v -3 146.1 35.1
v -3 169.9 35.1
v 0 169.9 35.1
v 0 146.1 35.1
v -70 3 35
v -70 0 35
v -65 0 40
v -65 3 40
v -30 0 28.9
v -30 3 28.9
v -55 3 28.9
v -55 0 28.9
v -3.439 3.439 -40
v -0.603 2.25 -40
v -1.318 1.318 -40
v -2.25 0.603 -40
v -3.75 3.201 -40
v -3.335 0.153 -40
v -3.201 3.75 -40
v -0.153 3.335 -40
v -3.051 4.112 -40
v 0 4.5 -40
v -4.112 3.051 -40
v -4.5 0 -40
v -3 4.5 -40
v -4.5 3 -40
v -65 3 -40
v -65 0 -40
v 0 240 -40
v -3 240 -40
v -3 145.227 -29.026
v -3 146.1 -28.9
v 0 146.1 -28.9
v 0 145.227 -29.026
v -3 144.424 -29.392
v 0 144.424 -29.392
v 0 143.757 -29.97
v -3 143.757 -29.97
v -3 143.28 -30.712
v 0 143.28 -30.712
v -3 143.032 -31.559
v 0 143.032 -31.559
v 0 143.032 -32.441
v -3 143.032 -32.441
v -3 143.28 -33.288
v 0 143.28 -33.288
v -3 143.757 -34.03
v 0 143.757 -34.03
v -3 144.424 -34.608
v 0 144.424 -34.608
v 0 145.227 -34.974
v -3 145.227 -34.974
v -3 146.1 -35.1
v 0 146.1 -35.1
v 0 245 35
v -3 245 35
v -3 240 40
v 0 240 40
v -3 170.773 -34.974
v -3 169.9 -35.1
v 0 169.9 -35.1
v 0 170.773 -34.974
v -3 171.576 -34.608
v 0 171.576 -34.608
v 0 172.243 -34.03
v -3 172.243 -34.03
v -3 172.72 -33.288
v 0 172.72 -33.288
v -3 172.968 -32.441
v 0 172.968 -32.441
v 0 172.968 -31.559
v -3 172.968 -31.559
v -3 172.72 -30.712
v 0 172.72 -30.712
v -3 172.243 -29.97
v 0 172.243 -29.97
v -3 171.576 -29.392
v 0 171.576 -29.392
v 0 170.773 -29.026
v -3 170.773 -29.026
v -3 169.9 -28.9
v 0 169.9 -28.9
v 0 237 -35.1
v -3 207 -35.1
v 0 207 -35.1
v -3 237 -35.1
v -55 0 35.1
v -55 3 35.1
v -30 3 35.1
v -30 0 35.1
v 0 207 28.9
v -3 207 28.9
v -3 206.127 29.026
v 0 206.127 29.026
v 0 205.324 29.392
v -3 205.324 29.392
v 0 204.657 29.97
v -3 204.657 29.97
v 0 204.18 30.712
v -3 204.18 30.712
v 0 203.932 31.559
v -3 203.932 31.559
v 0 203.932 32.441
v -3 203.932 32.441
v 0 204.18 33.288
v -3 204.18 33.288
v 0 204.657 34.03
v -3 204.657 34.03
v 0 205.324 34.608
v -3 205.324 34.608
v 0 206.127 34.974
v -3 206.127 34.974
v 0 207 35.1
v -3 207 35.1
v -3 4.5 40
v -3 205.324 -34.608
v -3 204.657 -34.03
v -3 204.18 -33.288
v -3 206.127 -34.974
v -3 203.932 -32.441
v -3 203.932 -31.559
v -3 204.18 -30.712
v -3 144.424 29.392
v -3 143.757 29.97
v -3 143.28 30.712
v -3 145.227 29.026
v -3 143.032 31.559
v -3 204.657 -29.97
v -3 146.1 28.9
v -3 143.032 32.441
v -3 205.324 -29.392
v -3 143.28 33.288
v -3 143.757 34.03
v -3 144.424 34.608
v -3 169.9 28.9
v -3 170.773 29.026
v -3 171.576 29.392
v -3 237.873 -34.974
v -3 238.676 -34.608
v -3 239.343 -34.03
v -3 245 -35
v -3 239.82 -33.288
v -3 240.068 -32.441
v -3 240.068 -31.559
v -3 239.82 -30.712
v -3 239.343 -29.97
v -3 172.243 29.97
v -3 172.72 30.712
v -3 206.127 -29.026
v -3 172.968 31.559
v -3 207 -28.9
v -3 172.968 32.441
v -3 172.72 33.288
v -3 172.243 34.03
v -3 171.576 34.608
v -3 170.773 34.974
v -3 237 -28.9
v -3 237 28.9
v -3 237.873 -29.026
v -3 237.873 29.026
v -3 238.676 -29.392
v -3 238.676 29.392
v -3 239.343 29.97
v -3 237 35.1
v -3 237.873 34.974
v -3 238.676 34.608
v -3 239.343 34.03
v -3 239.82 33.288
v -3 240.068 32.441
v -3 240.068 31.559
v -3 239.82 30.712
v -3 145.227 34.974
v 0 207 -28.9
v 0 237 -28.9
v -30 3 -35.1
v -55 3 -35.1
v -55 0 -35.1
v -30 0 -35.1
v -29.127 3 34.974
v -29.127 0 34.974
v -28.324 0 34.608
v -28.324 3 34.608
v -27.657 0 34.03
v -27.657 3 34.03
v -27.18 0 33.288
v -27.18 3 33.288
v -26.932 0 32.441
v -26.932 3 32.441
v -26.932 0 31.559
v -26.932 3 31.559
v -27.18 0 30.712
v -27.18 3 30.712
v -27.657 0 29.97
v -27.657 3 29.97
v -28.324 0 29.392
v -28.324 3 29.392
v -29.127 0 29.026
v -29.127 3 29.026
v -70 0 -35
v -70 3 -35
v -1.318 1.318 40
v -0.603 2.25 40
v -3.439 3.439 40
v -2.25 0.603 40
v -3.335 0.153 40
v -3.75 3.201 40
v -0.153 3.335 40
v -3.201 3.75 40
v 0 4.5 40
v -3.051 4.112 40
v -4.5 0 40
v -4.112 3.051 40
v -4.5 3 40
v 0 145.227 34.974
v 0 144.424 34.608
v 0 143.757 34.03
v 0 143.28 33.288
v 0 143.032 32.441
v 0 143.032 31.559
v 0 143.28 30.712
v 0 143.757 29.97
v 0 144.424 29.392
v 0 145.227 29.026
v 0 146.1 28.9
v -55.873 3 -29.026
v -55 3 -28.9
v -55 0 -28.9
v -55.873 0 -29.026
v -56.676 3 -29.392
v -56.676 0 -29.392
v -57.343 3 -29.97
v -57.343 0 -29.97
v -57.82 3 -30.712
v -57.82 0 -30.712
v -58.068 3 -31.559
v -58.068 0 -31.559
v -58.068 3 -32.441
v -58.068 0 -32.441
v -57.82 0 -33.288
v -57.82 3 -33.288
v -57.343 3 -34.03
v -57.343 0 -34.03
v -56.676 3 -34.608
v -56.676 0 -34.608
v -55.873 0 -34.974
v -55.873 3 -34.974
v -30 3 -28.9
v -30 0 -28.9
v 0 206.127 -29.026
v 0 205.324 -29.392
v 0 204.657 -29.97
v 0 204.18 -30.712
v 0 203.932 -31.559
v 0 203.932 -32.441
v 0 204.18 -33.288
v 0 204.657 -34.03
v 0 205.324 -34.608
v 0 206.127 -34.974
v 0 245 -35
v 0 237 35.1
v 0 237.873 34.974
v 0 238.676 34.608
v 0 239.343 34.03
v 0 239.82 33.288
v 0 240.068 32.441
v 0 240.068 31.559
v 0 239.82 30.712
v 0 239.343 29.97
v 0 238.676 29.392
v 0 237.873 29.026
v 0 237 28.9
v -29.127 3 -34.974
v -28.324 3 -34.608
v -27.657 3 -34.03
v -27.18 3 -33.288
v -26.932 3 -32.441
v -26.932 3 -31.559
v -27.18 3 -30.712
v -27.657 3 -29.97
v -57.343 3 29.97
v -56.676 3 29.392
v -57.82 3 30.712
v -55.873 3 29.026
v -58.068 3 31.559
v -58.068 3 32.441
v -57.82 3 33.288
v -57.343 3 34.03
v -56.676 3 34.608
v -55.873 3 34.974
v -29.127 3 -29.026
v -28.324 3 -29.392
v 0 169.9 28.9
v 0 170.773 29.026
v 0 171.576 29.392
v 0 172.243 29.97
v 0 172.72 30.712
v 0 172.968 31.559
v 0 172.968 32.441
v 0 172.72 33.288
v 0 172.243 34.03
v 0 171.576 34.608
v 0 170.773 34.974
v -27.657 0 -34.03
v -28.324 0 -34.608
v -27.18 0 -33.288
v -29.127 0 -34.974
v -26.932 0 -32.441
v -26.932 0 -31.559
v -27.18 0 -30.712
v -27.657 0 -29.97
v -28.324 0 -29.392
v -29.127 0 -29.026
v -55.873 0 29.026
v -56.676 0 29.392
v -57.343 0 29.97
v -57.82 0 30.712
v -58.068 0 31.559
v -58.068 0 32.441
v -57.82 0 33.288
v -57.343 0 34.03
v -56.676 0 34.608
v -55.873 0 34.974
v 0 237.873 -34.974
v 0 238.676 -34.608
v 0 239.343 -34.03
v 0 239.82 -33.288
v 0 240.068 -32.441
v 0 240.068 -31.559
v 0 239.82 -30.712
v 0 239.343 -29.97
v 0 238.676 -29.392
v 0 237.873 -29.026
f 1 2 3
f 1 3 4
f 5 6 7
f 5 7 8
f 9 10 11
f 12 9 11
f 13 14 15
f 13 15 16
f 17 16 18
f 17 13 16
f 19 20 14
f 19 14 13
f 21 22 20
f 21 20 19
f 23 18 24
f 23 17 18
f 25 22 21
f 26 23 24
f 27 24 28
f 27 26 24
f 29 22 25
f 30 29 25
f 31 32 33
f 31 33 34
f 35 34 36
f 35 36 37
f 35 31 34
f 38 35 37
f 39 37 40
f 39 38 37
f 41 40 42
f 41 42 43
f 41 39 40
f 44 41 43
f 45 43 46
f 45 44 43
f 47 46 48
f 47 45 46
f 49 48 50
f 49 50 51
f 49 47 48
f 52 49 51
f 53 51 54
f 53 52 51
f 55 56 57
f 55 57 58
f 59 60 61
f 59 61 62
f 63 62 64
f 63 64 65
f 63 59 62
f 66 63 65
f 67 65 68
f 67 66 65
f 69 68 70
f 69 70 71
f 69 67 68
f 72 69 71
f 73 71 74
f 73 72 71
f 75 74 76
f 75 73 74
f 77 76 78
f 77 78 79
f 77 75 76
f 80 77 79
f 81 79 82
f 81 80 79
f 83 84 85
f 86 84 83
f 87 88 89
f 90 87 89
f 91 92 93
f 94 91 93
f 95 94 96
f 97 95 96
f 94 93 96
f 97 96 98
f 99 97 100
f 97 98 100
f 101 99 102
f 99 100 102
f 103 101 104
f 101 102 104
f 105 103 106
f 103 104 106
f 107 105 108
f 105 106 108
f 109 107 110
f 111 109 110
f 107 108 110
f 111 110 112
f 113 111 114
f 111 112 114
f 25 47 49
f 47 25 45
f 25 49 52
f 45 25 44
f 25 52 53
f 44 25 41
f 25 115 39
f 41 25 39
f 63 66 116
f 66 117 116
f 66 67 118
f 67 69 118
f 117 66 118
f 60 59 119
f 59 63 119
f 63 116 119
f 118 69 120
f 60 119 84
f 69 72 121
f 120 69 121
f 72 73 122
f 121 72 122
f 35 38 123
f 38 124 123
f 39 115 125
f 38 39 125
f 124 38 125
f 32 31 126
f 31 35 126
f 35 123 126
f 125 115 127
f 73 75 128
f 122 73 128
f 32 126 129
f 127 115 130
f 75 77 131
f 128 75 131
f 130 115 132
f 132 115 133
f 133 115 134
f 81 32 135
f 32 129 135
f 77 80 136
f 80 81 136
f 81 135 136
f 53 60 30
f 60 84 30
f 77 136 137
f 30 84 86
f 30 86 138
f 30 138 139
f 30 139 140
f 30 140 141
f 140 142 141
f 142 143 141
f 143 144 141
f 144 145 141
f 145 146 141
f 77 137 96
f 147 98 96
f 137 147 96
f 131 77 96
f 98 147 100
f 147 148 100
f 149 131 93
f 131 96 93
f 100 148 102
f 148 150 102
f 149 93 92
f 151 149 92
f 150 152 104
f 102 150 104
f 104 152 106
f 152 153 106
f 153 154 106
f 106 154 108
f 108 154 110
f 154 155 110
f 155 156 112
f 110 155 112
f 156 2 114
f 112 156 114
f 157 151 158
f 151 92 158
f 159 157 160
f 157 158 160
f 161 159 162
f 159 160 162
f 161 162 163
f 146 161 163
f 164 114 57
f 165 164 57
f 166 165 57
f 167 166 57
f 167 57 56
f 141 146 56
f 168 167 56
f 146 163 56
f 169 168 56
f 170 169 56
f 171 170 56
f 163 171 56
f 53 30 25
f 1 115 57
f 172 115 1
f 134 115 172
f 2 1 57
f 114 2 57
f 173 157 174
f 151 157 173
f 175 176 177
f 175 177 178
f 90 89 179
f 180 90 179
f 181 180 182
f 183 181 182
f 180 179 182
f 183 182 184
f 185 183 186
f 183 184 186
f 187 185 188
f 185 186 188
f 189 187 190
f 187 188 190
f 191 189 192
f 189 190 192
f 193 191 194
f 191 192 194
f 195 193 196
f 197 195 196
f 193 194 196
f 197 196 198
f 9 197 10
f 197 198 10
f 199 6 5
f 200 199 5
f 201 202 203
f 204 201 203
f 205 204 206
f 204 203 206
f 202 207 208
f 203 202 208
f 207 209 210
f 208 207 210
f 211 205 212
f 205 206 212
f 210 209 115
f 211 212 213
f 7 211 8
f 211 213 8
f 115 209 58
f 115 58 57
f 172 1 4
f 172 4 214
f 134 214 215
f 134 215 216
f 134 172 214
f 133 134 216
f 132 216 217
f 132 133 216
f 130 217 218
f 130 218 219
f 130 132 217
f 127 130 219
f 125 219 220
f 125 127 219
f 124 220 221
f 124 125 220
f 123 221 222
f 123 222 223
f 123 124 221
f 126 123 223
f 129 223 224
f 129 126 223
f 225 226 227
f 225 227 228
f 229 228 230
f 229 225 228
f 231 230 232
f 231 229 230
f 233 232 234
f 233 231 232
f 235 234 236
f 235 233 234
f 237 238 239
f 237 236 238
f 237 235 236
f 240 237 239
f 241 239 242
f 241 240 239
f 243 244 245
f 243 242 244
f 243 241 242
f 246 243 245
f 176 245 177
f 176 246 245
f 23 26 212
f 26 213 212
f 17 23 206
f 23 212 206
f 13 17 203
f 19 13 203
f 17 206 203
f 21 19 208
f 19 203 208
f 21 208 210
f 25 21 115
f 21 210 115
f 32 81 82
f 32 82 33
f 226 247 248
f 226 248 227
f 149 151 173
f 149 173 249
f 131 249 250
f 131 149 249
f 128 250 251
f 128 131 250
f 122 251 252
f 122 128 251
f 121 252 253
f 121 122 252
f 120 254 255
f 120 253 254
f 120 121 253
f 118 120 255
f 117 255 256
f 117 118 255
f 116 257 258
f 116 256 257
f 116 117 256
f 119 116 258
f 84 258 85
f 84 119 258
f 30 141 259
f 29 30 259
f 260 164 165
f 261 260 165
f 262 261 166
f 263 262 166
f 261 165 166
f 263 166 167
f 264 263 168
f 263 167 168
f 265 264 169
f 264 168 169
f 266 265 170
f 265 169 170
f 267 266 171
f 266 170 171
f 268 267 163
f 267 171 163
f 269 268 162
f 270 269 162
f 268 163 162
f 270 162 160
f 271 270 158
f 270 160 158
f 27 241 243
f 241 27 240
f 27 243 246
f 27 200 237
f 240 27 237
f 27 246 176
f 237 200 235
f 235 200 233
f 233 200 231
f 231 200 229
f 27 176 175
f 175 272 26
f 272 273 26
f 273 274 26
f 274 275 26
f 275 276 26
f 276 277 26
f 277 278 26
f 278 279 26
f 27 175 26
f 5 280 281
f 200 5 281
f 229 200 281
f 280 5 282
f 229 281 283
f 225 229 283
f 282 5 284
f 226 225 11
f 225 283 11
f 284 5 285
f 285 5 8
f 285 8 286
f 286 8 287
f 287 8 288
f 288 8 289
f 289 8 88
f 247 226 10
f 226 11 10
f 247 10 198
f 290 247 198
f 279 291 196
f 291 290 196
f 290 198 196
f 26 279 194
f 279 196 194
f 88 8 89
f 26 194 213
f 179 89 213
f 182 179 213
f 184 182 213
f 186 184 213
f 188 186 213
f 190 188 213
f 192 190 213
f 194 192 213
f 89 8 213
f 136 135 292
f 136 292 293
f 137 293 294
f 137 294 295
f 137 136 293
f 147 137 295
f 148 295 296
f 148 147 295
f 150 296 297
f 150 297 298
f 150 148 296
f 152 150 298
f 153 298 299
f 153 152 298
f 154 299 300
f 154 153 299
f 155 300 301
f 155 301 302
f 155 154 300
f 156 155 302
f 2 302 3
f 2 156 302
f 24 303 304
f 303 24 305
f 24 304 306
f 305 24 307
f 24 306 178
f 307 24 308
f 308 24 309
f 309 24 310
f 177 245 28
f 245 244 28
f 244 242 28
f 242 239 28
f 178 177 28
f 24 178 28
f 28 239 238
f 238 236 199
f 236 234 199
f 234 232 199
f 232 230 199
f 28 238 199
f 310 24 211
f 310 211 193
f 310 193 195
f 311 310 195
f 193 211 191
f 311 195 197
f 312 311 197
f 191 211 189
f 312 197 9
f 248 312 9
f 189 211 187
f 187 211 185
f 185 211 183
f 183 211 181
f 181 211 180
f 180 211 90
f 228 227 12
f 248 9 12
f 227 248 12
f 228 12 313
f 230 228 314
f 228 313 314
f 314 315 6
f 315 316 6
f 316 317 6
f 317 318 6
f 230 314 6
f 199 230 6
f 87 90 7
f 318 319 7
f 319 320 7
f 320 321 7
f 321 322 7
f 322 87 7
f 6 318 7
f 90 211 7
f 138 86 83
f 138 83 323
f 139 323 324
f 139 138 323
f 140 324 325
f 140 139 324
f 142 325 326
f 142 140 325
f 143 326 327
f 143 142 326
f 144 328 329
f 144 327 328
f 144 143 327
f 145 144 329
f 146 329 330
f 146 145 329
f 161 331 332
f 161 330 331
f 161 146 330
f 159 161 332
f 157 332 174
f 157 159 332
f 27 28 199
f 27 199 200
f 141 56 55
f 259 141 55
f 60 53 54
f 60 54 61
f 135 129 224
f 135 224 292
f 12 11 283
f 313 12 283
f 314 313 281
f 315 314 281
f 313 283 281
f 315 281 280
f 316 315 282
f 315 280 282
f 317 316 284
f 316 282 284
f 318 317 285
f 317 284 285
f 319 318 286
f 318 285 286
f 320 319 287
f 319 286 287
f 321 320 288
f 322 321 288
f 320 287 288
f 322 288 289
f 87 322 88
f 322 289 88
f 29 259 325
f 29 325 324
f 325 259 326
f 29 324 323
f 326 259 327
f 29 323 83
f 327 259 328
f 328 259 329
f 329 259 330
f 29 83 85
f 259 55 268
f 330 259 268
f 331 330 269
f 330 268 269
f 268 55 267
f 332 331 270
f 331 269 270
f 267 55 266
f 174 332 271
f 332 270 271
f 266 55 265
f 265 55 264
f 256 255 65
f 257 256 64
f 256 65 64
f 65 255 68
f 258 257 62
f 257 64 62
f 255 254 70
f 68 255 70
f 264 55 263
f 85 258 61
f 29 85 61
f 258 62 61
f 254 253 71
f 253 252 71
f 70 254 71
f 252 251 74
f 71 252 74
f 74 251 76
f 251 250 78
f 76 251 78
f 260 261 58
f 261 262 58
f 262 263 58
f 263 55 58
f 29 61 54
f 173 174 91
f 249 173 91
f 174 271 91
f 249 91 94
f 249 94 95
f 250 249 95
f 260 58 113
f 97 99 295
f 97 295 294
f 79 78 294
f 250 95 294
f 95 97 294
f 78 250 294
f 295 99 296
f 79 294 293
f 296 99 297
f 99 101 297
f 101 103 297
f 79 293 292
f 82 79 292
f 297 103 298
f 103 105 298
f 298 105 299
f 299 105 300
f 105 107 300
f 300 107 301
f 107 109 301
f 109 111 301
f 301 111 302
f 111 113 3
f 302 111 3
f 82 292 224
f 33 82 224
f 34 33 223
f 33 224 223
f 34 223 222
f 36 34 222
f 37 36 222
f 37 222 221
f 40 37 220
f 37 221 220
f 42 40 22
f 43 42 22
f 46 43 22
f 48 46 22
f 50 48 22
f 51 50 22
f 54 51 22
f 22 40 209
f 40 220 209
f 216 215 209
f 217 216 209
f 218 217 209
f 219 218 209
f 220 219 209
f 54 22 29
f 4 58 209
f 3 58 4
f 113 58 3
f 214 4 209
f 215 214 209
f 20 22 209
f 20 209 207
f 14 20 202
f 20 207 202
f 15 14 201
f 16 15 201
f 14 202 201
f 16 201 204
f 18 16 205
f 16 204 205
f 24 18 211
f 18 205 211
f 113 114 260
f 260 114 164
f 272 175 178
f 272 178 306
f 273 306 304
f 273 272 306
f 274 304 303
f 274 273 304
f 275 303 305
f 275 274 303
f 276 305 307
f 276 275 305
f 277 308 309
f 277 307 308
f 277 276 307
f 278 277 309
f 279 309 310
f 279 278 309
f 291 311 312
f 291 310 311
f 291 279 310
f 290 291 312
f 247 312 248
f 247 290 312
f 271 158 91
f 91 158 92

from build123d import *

# Parameters (mm, degrees)
SM_BASE_FLANGE_1_DEPTH      = 40
CHAMFER_1_SIZE              = 5
CUT_EXTRUDE_1_DEPTH         = 258.126428047
CUT_EXTRUDE_2_DEPTH         = 256.076459125
HOLE_START                  = -3
HOLE_WIZARD_6_2_6_2_1_DEPTH = 3


# Read off the part's stored shape, not the designer's step: Ø6.2 (6.2) 直径槽口1
# Sheet-metal steps are written as plain solids
with BuildPart() as part:
    # Sketch 2 → 基体-法兰1 (new, symmetric)
    with BuildSketch(Plane.XY):
        with BuildLine():
            Line((0, 245), (0, 4.5))
            ThreePointArc((0, 4.5), (-1.318019485, 1.318019485), (-4.5, 0))
            Line((-4.5, 0), (-70, 0))
            Line((-70, 0), (-70, 3))
            Line((-70, 3), (-4.5, 3))
            ThreePointArc((-4.5, 3), (-3.439339828, 3.439339828), (-3, 4.5))
            Line((-3, 4.5), (-3, 245))
            Line((-3, 245), (0, 245))
        make_face()
    extrude(amount=SM_BASE_FLANGE_1_DEPTH, both=True)

    # 倒角1
    chamfer_1_edges = [part.edges().sort_by_distance(p)[0] for p in [
        (-1.5, 245, 40),
        (-70, 1.5, 40),
        (-1.5, 245, -40),
        (-70, 1.5, -40),
    ]]
    chamfer(chamfer_1_edges, length=CHAMFER_1_SIZE)

    # 草图7 → 切除-拉伸1 (cut, through all)
    with BuildSketch(Plane.ZY.offset(3)):
        with BuildLine():
            Line((-28.9, 237), (-28.9, 207))
            ThreePointArc((-28.9, 207), (-32, 203.9), (-35.1, 207))
            Line((-35.1, 207), (-35.1, 237))
            ThreePointArc((-35.1, 237), (-32, 240.1), (-28.9, 237))
        make_face()
    cut_extrude_1 = extrude(amount=-CUT_EXTRUDE_1_DEPTH, mode=Mode.SUBTRACT)

    # 草图10 → 切除-拉伸2 (cut, through all)
    with BuildSketch(Plane(origin=(0, 3, 0), x_dir=(1, 0, 0), z_dir=(0, 1, 0))):
        with BuildLine():
            Line((-55, 35.1), (-30, 35.1))
            ThreePointArc((-30, 35.1), (-26.9, 32), (-30, 28.9))
            Line((-30, 28.9), (-55, 28.9))
            ThreePointArc((-55, 28.9), (-58.1, 32), (-55, 35.1))
        make_face()
    cut_extrude_2 = extrude(amount=-CUT_EXTRUDE_2_DEPTH, mode=Mode.SUBTRACT)

    # 镜向1: 切除-拉伸1, 切除-拉伸2 across plane
    add(cut_extrude_1.mirror(Plane.XY), mode=Mode.SUBTRACT)
    add(cut_extrude_2.mirror(Plane.XY), mode=Mode.SUBTRACT)

    # Ø6.2 (6.2) 直径槽口1 outline → Ø6.2 (6.2) 直径槽口1 (cut)
    with BuildSketch(Plane.YZ.offset(HOLE_START)):
        with BuildLine():
            ThreePointArc((169.9, -35.1), (173, -32), (169.9, -28.9))
            Line((169.9, -28.9), (146.1, -28.9))
            ThreePointArc((146.1, -28.9), (143, -32), (146.1, -35.1))
            Line((146.1, -35.1), (169.9, -35.1))
        make_face()
        with BuildLine():
            ThreePointArc((169.9, 28.9), (173, 32), (169.9, 35.1))
            Line((169.9, 35.1), (146.1, 35.1))
            ThreePointArc((146.1, 35.1), (143, 32), (146.1, 28.9))
            Line((146.1, 28.9), (169.9, 28.9))
        make_face()
    extrude(amount=HOLE_WIZARD_6_2_6_2_1_DEPTH, mode=Mode.SUBTRACT)


solid = part.part
